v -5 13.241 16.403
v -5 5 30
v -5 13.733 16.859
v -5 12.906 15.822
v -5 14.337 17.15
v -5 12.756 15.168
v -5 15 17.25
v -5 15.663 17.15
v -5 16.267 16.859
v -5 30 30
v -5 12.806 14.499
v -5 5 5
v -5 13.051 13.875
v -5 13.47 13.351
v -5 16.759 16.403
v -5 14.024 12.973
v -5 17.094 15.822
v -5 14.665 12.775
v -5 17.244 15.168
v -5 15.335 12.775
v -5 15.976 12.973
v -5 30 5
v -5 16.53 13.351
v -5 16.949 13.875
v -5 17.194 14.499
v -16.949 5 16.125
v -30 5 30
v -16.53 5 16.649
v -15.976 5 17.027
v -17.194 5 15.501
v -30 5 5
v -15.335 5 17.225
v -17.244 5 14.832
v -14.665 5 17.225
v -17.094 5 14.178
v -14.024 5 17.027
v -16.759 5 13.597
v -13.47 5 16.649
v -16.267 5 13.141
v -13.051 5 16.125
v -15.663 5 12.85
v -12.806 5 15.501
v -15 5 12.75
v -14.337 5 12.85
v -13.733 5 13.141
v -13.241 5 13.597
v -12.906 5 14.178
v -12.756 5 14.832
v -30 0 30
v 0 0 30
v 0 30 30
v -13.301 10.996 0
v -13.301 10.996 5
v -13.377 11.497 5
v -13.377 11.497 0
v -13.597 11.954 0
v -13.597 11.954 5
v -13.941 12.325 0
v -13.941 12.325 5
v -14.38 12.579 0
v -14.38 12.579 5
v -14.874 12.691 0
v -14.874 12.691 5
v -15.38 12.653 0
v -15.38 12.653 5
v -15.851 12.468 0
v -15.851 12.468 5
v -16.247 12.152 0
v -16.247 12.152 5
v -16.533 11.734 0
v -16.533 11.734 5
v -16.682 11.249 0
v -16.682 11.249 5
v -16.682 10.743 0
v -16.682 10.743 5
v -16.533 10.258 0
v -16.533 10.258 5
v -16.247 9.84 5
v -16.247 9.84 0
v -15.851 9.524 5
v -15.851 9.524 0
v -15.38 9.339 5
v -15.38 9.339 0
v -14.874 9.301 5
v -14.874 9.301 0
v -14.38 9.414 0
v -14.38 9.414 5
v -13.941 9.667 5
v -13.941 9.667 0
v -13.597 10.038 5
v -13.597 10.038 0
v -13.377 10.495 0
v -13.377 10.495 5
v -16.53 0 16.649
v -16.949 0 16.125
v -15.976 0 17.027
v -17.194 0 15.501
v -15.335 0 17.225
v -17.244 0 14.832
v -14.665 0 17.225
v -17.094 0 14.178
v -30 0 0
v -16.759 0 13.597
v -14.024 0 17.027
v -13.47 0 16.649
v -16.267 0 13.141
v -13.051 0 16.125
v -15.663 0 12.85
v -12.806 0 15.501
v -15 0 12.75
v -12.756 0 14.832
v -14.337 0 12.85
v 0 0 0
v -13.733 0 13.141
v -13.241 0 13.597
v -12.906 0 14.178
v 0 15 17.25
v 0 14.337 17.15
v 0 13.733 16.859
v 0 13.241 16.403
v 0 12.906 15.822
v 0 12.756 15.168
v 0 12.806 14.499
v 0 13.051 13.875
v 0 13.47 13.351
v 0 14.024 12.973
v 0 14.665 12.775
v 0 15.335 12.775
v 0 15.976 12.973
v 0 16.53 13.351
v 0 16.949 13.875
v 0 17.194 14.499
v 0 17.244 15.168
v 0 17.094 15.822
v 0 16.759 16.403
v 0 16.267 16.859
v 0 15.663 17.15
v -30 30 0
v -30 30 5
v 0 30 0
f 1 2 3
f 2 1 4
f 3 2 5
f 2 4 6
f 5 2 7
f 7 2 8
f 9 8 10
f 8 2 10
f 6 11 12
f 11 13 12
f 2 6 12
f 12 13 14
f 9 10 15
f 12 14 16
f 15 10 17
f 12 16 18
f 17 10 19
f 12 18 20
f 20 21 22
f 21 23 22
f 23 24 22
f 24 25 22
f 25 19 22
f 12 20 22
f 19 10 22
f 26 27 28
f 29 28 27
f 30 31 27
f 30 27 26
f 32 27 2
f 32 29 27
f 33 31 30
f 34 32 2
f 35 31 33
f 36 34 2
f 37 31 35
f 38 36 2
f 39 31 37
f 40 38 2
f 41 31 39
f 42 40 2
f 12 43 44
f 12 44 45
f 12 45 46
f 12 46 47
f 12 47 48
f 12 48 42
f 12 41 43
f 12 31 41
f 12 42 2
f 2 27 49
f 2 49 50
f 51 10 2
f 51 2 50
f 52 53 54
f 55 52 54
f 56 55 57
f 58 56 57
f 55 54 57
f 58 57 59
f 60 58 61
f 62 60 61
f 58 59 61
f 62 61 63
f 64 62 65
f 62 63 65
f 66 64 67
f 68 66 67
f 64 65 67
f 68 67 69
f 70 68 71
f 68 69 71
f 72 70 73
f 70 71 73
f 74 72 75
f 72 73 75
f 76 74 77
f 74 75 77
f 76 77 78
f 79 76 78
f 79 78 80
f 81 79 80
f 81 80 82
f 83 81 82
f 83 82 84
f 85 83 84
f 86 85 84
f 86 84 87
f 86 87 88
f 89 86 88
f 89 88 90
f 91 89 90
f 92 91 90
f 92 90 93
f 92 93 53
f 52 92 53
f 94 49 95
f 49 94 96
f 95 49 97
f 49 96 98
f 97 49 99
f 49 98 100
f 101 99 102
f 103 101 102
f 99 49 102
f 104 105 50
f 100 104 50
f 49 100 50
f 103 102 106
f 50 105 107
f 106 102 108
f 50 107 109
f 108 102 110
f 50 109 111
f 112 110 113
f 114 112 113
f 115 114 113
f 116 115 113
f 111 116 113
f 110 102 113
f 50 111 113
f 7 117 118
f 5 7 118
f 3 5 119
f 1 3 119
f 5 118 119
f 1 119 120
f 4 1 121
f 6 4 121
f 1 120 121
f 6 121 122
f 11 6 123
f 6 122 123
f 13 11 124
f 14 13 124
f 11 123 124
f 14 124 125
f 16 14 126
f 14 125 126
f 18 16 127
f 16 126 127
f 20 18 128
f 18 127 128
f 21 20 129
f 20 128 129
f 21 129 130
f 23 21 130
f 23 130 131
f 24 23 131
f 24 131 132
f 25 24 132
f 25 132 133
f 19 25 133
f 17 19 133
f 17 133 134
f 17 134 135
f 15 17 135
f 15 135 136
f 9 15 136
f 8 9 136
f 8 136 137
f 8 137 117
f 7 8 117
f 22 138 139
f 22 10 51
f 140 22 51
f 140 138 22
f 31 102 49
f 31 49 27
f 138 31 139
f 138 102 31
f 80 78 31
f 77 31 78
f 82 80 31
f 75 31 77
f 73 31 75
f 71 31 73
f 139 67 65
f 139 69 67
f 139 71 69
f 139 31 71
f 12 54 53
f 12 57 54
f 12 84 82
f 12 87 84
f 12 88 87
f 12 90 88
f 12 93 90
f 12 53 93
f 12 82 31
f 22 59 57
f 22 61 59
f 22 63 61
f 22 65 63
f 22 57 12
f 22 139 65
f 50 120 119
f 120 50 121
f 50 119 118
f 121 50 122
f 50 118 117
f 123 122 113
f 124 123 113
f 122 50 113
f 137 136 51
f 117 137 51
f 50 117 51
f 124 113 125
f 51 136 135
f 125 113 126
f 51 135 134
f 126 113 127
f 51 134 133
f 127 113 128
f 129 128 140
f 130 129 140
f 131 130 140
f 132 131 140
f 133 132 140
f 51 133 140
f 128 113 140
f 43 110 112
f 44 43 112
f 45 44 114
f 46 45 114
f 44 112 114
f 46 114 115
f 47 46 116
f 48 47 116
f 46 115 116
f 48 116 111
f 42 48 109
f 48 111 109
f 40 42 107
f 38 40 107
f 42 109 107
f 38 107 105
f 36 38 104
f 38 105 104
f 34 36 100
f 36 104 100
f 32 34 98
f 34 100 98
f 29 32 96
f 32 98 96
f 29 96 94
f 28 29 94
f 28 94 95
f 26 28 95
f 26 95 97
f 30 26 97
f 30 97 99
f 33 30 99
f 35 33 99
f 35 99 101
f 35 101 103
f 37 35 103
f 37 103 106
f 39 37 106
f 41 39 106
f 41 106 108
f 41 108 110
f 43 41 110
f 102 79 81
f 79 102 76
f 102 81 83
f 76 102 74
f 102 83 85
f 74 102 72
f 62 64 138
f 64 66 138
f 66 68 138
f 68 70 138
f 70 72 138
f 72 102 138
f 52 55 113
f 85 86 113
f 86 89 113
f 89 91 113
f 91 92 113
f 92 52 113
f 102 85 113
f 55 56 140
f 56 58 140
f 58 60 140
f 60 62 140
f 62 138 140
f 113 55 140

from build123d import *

# Parameters (mm, degrees)
ESBO_O1_W                         = 30
ESBO_O1_H                         = 30
RESSALTO_EXTRUS_O1_DEPTH          = 30
ESBO_O3_W                         = 25
ESBO_O3_H                         = 25
CORTE_EXTRUS_O2_DEPTH             = 25
FURO_COM_FOLGA_DE_M41_D           = 4.5
FURO_COM_FOLGA_DE_M41_ON_FACE_2_D = 4.5
FURO_COM_FOLGA_DE_M32_D           = 3.4


with BuildPart() as part:
    # Esboço1 → Ressalto-extrusão1 (new body)
    with BuildSketch(Plane.XY):
        with Locations((-15, 15)):
            Rectangle(ESBO_O1_W, ESBO_O1_H)
    extrude(amount=RESSALTO_EXTRUS_O1_DEPTH)

    # Esboço3 → Corte-extrusão2 (cut)
    with BuildSketch(Plane(origin=(0, 30, 0), x_dir=(1, 0, 0), z_dir=(0, 1, 0))):
        with Locations((-17.5, -17.5)):
            Rectangle(ESBO_O3_W, ESBO_O3_H)
    extrude(amount=-CORTE_EXTRUS_O2_DEPTH, mode=Mode.SUBTRACT)

    # Furo com folga de M41 (through all)
    with Locations(Plane(origin=(-5, 15, 15), x_dir=(0, 0, -1), z_dir=(-1, 0, 0))):
        with Locations((0, 0)):
            Hole(FURO_COM_FOLGA_DE_M41_D / 2)

    # Furo com folga de M41 on face 2 (through all)
    with Locations(Plane(origin=(-15, 5, 15), x_dir=(0, 0, 1), z_dir=(0, 1, 0))):
        with Locations((0, 0)):
            Hole(FURO_COM_FOLGA_DE_M41_ON_FACE_2_D / 2)

    # Furo com folga de M32 (through all)
    with Locations(Plane(origin=(-15.001293069, 10.996070653, 0), x_dir=(-1, 0, 0), z_dir=(0, 0, -1))):
        with Locations((0, 0)):
            Hole(FURO_COM_FOLGA_DE_M32_D / 2)


solid = part.part
